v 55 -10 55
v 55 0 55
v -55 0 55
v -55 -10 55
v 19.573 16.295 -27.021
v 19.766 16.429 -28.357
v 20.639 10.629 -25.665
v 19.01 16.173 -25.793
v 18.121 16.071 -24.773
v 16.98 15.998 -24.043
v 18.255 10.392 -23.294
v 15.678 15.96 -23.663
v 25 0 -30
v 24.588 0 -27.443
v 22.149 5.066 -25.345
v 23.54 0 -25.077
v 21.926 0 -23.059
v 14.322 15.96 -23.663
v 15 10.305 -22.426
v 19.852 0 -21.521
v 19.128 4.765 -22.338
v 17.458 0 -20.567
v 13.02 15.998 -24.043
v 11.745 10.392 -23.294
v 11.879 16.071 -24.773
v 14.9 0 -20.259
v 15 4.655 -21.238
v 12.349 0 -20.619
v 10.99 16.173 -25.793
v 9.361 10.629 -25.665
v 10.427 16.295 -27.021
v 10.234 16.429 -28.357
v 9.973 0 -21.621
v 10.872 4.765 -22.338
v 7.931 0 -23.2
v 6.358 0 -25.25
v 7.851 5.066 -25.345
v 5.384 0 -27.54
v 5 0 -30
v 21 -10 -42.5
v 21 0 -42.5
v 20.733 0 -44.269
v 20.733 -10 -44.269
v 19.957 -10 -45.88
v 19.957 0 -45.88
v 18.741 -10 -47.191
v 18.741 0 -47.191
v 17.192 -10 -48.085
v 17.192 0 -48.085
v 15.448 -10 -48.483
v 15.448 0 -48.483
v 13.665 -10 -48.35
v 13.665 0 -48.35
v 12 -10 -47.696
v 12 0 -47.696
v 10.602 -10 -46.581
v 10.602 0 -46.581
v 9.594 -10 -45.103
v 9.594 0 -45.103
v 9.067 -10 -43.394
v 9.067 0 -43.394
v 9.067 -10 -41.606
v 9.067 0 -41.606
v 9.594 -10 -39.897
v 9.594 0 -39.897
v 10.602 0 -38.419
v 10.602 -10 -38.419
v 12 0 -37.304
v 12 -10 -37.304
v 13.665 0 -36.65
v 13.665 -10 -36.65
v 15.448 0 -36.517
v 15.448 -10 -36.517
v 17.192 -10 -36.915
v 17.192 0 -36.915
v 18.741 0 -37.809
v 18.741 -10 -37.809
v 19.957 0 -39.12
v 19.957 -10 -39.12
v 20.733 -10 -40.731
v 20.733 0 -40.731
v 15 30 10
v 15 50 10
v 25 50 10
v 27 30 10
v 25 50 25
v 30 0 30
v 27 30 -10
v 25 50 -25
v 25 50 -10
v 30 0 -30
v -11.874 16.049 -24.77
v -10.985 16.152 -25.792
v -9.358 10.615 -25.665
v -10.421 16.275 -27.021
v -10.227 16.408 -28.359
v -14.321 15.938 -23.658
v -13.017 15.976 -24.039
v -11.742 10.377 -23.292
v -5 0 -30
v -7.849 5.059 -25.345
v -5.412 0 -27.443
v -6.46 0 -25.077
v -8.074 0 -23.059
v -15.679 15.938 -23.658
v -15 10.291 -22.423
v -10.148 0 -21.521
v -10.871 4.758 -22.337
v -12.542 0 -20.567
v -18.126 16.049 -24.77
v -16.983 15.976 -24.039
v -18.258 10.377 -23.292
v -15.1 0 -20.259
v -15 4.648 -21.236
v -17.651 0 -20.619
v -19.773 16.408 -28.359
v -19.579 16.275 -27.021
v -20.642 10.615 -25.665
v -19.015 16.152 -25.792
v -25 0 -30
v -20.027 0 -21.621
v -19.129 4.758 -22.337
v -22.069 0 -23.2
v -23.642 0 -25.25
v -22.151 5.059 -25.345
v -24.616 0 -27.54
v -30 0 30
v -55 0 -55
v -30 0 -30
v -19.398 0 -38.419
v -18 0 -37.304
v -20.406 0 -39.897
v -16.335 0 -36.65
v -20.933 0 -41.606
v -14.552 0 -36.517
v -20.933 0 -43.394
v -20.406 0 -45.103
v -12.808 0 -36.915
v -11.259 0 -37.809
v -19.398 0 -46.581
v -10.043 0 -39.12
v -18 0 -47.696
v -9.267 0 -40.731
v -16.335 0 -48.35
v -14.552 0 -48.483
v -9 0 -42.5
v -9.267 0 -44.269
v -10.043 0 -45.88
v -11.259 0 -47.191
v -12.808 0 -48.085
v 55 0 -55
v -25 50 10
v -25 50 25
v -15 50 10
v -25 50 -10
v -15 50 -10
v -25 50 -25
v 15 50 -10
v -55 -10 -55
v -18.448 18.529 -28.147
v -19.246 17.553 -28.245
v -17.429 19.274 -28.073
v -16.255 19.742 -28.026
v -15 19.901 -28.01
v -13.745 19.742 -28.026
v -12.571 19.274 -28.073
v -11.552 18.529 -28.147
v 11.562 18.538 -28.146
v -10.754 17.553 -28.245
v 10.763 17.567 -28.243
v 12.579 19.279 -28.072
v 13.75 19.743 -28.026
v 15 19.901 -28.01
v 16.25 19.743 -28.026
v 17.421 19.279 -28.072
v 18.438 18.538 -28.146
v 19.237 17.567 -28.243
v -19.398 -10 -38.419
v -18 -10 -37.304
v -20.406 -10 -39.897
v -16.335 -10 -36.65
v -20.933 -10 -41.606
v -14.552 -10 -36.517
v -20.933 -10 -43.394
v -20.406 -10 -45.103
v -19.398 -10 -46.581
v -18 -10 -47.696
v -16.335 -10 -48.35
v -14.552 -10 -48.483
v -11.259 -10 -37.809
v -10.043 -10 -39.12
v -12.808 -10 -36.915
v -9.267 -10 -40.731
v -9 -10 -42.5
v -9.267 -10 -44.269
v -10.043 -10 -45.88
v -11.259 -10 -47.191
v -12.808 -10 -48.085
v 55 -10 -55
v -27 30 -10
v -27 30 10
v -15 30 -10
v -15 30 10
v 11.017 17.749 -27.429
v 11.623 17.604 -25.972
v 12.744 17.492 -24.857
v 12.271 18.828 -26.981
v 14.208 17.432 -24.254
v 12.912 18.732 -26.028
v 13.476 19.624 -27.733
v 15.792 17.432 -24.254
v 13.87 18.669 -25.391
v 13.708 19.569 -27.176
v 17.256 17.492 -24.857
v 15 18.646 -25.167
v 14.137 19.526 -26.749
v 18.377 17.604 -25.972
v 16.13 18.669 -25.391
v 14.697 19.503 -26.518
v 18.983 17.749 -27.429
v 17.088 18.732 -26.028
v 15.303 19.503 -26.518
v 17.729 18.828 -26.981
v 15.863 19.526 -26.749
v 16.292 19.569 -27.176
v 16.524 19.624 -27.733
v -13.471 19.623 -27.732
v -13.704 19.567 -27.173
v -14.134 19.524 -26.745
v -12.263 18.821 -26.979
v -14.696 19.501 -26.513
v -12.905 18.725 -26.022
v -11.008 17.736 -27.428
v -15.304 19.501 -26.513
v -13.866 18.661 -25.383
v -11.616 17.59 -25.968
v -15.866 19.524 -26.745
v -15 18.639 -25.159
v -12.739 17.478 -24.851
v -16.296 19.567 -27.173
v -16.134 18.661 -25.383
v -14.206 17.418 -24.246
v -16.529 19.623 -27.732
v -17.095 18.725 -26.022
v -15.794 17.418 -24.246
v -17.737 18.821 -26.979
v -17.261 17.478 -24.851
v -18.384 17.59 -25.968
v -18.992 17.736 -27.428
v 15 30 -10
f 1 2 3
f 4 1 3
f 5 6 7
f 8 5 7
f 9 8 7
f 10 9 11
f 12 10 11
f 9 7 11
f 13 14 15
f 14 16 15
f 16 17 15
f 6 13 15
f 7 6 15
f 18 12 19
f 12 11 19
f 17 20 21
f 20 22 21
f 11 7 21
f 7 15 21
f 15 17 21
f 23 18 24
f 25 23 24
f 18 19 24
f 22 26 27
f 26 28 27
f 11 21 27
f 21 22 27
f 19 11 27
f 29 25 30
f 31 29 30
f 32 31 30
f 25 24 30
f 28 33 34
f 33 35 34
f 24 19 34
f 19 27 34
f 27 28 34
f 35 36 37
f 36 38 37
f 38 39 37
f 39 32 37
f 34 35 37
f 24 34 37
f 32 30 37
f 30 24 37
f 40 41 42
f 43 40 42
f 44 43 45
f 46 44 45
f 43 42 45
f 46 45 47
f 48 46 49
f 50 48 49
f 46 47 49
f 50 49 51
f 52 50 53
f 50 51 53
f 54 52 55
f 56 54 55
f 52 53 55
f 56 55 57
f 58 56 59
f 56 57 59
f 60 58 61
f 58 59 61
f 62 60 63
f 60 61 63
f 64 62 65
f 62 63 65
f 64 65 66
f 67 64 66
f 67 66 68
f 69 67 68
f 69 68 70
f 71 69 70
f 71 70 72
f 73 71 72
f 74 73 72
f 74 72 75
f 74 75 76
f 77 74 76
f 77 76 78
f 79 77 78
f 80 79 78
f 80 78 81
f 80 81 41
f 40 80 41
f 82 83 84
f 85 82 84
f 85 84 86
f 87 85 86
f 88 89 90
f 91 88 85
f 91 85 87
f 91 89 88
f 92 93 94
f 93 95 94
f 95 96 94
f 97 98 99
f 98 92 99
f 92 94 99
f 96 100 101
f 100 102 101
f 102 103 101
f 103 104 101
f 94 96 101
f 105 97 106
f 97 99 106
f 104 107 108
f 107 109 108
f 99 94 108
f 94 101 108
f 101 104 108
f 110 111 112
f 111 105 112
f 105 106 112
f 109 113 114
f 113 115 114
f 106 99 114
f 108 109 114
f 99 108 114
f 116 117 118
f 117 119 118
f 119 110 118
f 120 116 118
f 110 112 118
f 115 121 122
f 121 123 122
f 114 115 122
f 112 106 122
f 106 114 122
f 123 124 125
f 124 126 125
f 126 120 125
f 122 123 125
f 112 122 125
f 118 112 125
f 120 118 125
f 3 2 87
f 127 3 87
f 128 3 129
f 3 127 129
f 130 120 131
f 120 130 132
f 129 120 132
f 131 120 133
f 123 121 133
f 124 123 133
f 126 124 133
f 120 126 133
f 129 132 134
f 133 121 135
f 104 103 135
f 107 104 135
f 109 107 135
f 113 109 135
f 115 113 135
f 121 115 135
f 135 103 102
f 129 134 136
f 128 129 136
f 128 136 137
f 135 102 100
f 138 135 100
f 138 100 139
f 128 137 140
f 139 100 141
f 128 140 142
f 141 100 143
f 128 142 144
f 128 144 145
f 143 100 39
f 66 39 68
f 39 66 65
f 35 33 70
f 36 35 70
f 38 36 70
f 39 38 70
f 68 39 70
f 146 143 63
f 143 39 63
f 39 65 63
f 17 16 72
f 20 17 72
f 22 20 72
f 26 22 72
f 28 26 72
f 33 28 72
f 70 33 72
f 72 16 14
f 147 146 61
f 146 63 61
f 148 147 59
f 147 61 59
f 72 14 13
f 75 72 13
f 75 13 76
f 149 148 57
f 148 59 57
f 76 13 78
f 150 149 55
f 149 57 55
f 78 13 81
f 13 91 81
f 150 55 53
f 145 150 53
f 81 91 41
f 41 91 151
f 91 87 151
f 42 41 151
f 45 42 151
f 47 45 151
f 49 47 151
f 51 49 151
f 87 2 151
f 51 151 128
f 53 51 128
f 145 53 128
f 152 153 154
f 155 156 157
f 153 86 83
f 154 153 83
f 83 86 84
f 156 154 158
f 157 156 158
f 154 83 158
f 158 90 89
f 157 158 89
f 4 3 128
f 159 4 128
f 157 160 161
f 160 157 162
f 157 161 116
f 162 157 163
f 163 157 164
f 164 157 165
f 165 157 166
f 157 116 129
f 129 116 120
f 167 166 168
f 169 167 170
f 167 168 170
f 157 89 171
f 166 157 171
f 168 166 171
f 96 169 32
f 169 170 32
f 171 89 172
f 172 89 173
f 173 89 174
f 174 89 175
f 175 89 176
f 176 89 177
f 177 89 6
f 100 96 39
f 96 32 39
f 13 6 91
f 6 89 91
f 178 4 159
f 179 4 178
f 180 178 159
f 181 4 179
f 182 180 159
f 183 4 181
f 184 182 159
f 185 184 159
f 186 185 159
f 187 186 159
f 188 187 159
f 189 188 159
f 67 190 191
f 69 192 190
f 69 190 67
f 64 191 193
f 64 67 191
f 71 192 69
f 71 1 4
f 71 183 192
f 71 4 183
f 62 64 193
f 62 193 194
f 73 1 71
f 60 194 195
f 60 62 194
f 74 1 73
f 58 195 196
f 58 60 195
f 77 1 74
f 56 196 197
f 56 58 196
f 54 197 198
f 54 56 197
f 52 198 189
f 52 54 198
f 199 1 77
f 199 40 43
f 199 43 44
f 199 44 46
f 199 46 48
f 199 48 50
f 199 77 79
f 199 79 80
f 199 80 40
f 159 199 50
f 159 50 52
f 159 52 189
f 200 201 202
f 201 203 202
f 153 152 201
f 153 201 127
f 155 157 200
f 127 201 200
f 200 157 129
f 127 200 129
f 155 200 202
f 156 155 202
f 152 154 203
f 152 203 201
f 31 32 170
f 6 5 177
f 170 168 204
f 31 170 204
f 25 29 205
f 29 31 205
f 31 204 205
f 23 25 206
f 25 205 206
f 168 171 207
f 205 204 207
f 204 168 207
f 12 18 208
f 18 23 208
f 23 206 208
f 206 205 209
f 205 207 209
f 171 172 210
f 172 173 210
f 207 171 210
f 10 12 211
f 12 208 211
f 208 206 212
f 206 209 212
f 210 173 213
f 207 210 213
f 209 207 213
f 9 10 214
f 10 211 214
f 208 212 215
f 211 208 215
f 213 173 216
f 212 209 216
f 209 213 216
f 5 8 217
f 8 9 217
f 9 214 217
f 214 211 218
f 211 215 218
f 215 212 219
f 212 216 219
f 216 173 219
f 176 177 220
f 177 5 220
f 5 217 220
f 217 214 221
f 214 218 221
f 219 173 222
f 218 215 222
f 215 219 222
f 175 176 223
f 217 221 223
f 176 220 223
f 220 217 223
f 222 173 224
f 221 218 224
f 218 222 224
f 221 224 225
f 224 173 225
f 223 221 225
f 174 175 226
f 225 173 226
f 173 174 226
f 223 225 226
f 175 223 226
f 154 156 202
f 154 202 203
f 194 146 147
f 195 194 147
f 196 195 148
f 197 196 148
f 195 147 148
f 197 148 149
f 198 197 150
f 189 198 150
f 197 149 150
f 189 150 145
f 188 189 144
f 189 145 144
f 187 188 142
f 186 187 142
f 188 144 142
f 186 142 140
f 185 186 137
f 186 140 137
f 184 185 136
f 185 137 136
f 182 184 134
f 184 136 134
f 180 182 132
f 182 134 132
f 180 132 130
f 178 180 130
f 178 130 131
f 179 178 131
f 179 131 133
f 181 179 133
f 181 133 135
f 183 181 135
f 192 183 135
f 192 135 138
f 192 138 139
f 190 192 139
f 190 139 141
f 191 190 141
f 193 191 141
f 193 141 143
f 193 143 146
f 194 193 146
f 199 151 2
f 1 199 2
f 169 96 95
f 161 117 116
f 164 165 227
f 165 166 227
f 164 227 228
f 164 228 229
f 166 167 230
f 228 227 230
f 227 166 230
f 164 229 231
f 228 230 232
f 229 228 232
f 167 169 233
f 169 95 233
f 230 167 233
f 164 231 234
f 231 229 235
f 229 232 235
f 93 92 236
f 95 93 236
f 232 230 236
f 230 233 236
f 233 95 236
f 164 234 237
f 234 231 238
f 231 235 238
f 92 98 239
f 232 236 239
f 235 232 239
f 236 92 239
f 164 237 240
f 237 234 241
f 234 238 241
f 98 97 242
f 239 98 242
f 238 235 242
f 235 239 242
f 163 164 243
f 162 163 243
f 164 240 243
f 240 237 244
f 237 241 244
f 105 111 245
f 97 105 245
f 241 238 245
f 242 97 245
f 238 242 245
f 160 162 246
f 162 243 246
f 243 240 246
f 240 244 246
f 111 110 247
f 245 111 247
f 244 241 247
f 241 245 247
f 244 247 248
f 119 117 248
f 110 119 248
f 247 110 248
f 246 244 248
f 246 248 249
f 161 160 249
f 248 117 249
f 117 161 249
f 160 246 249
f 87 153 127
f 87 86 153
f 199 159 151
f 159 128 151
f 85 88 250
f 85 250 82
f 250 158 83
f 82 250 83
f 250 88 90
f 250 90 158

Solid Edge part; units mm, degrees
sketch "Sketch1" plane through (0, 0, 0) normal (0, -1, 0) x (1, 0, 0)
  line L0 (30, 30) -> (-30, 30)
  line L1 (-30, 30) -> (-30, -30)
  line L2 (-30, -30) -> (30, -30)
  line L3 (30, -30) -> (30, 30)
extrude "Protrusion1" add sketch "Sketch1" against normal blind 50
sketch "Sketch2" plane through (30, 25, 0) normal (1, 0, 0) x (0, 0, -1)
  line L0 (30, 25) -> (25, 25)
  line L1 (25, 25) -> (30, -25)
  line L2 (30, -25) -> (30, 25)
extrude "ExtrudedCutout_1" cut sketch "Sketch2" against normal blind 60 and the other way blind 1
sketch "Sketch3" plane through (30, 25, 0) normal (1, 0, 0) x (0, 0, -1)
  line L0 (-30, 25) -> (-30, -25)
  line L1 (-25, 25) -> (-30, -25)
  line L2 (-30, 25) -> (-25, 25)
extrude "ExtrudedCutout_2" cut sketch "Sketch3" against normal blind 60 and the other way blind 1
extrude "Protrusion2" [suppressed]
sketch "Sketch4" plane through (0, 25, -35) normal (0, 0, -1) x (-1, 0, 0)
  line L0 (30, 25) -> (25, 25)
  line L1 (25, 25) -> (30, -25)
  line L2 (30, -25) -> (30, 25)
extrude "ExtrudedCutout_3" cut sketch "Sketch4" against normal blind 65 and the other way blind 1
sketch "Sketch5" plane through (0, 25, -35) normal (0, 0, -1) x (-1, 0, 0)
  line L0 (-30, -25) -> (-30, 25)
  line L1 (-30, 25) -> (-25, 25)
  line L2 (-25, 25) -> (-30, -25)
extrude "ExtrudedCutout_4" cut sketch "Sketch5" against normal blind 65 and the other way blind 1
sketch "Sketch6" plane through (0, 50, 0) normal (0, 1, 0) x (1, 0, 0)
  line L0 (15, -10) -> (25, -10)
  line L1 (15, 10) -> (15, -10)
  line L2 (25, 10) -> (15, 10)
  line L3 (25, 10) -> (30, 10)
  line L4 (30, 10) -> (30, -10)
  line L5 (30, -10) -> (25, -10)
extrude "ExtrudedCutout_5" cut sketch "Sketch6" against normal blind 20 and the other way blind 1
sketch "Sketch7" plane through (0, 50, 0) normal (0, 1, 0) x (0, 0, -1)
  line L0 (10, 25) -> (10, 15)
  line L1 (10, 15) -> (-10, 15)
  line L2 (-10, 15) -> (-10, 30)
  line L3 (-10, 30) -> (10, 30)
  line L4 (10, 30) -> (10, 25)
extrude "ExtrudedCutout_6" cut sketch "Sketch7" against normal blind 20 and the other way blind 1
sketch "Sketch8" plane through (0, 25, -27.5) normal (0, 0.0995, -0.995) x (-1, 0, 0)
  line L0 (-15, -25.1247) -> (-15, -10.1247)
  line L1 (-15, -10.1247) -> (-15, -5.1247)
  line L2 (-25, -25.1247) -> (-19.7663, -8.6138)
  line L3 (-25, -25.1247) -> (-15, -25.1247)
  arc A0 (-19.7663, -8.6139) -> (-15, -5.1246) centre (-15, -10.1246) cw
revolve "RevolvedCutout_1" cut sketch "Sketch8" angle 180 about axis through (15, 0, -30) along (0, -0.995, -0.0995)
sketch "Sketch9" plane through (0, 25, -27.5) normal (0, 0.0995, -0.995) x (-1, 0, 0)
  line L0 (25, -25.1247) -> (19.7728, -8.6345)
  line L1 (25, -25.1247) -> (15, -25.1247)
  line L2 (15, -25.1247) -> (15, -10.1247)
  line L3 (15, -10.1247) -> (15, -5.1247)
  arc A0 (15, -5.1246) -> (19.7728, -8.6346) centre (15, -10.1246) cw
revolve "RevolvedCutout_2" cut sketch "Sketch9" angle 180 about axis through (-15, 0, -30) along (0, 0.995, 0.0995)
sketch "Sketch10" plane through (0, 0, 0) normal (0, -1, 0) x (0, 0, 1)
  line L0 (55, 55) -> (-55, 55)
  line L1 (-55, 55) -> (-55, -55)
  line L2 (-55, -55) -> (55, -55)
  line L3 (55, -55) -> (55, 55)
extrude "ExtrudedProtrusion_4" add sketch "Sketch10" along normal blind 10
sketch "Sketch11" plane through (0, 0, 0) normal (0, 1, 0) x (1, 0, 0)
  circle A0 centre (15, 42.5) radius 6
  circle A1 centre (-15, 42.5) radius 6
extrude "ExtrudedCutout_8" cut sketch "Sketch11" against normal blind 10 and the other way blind 1
